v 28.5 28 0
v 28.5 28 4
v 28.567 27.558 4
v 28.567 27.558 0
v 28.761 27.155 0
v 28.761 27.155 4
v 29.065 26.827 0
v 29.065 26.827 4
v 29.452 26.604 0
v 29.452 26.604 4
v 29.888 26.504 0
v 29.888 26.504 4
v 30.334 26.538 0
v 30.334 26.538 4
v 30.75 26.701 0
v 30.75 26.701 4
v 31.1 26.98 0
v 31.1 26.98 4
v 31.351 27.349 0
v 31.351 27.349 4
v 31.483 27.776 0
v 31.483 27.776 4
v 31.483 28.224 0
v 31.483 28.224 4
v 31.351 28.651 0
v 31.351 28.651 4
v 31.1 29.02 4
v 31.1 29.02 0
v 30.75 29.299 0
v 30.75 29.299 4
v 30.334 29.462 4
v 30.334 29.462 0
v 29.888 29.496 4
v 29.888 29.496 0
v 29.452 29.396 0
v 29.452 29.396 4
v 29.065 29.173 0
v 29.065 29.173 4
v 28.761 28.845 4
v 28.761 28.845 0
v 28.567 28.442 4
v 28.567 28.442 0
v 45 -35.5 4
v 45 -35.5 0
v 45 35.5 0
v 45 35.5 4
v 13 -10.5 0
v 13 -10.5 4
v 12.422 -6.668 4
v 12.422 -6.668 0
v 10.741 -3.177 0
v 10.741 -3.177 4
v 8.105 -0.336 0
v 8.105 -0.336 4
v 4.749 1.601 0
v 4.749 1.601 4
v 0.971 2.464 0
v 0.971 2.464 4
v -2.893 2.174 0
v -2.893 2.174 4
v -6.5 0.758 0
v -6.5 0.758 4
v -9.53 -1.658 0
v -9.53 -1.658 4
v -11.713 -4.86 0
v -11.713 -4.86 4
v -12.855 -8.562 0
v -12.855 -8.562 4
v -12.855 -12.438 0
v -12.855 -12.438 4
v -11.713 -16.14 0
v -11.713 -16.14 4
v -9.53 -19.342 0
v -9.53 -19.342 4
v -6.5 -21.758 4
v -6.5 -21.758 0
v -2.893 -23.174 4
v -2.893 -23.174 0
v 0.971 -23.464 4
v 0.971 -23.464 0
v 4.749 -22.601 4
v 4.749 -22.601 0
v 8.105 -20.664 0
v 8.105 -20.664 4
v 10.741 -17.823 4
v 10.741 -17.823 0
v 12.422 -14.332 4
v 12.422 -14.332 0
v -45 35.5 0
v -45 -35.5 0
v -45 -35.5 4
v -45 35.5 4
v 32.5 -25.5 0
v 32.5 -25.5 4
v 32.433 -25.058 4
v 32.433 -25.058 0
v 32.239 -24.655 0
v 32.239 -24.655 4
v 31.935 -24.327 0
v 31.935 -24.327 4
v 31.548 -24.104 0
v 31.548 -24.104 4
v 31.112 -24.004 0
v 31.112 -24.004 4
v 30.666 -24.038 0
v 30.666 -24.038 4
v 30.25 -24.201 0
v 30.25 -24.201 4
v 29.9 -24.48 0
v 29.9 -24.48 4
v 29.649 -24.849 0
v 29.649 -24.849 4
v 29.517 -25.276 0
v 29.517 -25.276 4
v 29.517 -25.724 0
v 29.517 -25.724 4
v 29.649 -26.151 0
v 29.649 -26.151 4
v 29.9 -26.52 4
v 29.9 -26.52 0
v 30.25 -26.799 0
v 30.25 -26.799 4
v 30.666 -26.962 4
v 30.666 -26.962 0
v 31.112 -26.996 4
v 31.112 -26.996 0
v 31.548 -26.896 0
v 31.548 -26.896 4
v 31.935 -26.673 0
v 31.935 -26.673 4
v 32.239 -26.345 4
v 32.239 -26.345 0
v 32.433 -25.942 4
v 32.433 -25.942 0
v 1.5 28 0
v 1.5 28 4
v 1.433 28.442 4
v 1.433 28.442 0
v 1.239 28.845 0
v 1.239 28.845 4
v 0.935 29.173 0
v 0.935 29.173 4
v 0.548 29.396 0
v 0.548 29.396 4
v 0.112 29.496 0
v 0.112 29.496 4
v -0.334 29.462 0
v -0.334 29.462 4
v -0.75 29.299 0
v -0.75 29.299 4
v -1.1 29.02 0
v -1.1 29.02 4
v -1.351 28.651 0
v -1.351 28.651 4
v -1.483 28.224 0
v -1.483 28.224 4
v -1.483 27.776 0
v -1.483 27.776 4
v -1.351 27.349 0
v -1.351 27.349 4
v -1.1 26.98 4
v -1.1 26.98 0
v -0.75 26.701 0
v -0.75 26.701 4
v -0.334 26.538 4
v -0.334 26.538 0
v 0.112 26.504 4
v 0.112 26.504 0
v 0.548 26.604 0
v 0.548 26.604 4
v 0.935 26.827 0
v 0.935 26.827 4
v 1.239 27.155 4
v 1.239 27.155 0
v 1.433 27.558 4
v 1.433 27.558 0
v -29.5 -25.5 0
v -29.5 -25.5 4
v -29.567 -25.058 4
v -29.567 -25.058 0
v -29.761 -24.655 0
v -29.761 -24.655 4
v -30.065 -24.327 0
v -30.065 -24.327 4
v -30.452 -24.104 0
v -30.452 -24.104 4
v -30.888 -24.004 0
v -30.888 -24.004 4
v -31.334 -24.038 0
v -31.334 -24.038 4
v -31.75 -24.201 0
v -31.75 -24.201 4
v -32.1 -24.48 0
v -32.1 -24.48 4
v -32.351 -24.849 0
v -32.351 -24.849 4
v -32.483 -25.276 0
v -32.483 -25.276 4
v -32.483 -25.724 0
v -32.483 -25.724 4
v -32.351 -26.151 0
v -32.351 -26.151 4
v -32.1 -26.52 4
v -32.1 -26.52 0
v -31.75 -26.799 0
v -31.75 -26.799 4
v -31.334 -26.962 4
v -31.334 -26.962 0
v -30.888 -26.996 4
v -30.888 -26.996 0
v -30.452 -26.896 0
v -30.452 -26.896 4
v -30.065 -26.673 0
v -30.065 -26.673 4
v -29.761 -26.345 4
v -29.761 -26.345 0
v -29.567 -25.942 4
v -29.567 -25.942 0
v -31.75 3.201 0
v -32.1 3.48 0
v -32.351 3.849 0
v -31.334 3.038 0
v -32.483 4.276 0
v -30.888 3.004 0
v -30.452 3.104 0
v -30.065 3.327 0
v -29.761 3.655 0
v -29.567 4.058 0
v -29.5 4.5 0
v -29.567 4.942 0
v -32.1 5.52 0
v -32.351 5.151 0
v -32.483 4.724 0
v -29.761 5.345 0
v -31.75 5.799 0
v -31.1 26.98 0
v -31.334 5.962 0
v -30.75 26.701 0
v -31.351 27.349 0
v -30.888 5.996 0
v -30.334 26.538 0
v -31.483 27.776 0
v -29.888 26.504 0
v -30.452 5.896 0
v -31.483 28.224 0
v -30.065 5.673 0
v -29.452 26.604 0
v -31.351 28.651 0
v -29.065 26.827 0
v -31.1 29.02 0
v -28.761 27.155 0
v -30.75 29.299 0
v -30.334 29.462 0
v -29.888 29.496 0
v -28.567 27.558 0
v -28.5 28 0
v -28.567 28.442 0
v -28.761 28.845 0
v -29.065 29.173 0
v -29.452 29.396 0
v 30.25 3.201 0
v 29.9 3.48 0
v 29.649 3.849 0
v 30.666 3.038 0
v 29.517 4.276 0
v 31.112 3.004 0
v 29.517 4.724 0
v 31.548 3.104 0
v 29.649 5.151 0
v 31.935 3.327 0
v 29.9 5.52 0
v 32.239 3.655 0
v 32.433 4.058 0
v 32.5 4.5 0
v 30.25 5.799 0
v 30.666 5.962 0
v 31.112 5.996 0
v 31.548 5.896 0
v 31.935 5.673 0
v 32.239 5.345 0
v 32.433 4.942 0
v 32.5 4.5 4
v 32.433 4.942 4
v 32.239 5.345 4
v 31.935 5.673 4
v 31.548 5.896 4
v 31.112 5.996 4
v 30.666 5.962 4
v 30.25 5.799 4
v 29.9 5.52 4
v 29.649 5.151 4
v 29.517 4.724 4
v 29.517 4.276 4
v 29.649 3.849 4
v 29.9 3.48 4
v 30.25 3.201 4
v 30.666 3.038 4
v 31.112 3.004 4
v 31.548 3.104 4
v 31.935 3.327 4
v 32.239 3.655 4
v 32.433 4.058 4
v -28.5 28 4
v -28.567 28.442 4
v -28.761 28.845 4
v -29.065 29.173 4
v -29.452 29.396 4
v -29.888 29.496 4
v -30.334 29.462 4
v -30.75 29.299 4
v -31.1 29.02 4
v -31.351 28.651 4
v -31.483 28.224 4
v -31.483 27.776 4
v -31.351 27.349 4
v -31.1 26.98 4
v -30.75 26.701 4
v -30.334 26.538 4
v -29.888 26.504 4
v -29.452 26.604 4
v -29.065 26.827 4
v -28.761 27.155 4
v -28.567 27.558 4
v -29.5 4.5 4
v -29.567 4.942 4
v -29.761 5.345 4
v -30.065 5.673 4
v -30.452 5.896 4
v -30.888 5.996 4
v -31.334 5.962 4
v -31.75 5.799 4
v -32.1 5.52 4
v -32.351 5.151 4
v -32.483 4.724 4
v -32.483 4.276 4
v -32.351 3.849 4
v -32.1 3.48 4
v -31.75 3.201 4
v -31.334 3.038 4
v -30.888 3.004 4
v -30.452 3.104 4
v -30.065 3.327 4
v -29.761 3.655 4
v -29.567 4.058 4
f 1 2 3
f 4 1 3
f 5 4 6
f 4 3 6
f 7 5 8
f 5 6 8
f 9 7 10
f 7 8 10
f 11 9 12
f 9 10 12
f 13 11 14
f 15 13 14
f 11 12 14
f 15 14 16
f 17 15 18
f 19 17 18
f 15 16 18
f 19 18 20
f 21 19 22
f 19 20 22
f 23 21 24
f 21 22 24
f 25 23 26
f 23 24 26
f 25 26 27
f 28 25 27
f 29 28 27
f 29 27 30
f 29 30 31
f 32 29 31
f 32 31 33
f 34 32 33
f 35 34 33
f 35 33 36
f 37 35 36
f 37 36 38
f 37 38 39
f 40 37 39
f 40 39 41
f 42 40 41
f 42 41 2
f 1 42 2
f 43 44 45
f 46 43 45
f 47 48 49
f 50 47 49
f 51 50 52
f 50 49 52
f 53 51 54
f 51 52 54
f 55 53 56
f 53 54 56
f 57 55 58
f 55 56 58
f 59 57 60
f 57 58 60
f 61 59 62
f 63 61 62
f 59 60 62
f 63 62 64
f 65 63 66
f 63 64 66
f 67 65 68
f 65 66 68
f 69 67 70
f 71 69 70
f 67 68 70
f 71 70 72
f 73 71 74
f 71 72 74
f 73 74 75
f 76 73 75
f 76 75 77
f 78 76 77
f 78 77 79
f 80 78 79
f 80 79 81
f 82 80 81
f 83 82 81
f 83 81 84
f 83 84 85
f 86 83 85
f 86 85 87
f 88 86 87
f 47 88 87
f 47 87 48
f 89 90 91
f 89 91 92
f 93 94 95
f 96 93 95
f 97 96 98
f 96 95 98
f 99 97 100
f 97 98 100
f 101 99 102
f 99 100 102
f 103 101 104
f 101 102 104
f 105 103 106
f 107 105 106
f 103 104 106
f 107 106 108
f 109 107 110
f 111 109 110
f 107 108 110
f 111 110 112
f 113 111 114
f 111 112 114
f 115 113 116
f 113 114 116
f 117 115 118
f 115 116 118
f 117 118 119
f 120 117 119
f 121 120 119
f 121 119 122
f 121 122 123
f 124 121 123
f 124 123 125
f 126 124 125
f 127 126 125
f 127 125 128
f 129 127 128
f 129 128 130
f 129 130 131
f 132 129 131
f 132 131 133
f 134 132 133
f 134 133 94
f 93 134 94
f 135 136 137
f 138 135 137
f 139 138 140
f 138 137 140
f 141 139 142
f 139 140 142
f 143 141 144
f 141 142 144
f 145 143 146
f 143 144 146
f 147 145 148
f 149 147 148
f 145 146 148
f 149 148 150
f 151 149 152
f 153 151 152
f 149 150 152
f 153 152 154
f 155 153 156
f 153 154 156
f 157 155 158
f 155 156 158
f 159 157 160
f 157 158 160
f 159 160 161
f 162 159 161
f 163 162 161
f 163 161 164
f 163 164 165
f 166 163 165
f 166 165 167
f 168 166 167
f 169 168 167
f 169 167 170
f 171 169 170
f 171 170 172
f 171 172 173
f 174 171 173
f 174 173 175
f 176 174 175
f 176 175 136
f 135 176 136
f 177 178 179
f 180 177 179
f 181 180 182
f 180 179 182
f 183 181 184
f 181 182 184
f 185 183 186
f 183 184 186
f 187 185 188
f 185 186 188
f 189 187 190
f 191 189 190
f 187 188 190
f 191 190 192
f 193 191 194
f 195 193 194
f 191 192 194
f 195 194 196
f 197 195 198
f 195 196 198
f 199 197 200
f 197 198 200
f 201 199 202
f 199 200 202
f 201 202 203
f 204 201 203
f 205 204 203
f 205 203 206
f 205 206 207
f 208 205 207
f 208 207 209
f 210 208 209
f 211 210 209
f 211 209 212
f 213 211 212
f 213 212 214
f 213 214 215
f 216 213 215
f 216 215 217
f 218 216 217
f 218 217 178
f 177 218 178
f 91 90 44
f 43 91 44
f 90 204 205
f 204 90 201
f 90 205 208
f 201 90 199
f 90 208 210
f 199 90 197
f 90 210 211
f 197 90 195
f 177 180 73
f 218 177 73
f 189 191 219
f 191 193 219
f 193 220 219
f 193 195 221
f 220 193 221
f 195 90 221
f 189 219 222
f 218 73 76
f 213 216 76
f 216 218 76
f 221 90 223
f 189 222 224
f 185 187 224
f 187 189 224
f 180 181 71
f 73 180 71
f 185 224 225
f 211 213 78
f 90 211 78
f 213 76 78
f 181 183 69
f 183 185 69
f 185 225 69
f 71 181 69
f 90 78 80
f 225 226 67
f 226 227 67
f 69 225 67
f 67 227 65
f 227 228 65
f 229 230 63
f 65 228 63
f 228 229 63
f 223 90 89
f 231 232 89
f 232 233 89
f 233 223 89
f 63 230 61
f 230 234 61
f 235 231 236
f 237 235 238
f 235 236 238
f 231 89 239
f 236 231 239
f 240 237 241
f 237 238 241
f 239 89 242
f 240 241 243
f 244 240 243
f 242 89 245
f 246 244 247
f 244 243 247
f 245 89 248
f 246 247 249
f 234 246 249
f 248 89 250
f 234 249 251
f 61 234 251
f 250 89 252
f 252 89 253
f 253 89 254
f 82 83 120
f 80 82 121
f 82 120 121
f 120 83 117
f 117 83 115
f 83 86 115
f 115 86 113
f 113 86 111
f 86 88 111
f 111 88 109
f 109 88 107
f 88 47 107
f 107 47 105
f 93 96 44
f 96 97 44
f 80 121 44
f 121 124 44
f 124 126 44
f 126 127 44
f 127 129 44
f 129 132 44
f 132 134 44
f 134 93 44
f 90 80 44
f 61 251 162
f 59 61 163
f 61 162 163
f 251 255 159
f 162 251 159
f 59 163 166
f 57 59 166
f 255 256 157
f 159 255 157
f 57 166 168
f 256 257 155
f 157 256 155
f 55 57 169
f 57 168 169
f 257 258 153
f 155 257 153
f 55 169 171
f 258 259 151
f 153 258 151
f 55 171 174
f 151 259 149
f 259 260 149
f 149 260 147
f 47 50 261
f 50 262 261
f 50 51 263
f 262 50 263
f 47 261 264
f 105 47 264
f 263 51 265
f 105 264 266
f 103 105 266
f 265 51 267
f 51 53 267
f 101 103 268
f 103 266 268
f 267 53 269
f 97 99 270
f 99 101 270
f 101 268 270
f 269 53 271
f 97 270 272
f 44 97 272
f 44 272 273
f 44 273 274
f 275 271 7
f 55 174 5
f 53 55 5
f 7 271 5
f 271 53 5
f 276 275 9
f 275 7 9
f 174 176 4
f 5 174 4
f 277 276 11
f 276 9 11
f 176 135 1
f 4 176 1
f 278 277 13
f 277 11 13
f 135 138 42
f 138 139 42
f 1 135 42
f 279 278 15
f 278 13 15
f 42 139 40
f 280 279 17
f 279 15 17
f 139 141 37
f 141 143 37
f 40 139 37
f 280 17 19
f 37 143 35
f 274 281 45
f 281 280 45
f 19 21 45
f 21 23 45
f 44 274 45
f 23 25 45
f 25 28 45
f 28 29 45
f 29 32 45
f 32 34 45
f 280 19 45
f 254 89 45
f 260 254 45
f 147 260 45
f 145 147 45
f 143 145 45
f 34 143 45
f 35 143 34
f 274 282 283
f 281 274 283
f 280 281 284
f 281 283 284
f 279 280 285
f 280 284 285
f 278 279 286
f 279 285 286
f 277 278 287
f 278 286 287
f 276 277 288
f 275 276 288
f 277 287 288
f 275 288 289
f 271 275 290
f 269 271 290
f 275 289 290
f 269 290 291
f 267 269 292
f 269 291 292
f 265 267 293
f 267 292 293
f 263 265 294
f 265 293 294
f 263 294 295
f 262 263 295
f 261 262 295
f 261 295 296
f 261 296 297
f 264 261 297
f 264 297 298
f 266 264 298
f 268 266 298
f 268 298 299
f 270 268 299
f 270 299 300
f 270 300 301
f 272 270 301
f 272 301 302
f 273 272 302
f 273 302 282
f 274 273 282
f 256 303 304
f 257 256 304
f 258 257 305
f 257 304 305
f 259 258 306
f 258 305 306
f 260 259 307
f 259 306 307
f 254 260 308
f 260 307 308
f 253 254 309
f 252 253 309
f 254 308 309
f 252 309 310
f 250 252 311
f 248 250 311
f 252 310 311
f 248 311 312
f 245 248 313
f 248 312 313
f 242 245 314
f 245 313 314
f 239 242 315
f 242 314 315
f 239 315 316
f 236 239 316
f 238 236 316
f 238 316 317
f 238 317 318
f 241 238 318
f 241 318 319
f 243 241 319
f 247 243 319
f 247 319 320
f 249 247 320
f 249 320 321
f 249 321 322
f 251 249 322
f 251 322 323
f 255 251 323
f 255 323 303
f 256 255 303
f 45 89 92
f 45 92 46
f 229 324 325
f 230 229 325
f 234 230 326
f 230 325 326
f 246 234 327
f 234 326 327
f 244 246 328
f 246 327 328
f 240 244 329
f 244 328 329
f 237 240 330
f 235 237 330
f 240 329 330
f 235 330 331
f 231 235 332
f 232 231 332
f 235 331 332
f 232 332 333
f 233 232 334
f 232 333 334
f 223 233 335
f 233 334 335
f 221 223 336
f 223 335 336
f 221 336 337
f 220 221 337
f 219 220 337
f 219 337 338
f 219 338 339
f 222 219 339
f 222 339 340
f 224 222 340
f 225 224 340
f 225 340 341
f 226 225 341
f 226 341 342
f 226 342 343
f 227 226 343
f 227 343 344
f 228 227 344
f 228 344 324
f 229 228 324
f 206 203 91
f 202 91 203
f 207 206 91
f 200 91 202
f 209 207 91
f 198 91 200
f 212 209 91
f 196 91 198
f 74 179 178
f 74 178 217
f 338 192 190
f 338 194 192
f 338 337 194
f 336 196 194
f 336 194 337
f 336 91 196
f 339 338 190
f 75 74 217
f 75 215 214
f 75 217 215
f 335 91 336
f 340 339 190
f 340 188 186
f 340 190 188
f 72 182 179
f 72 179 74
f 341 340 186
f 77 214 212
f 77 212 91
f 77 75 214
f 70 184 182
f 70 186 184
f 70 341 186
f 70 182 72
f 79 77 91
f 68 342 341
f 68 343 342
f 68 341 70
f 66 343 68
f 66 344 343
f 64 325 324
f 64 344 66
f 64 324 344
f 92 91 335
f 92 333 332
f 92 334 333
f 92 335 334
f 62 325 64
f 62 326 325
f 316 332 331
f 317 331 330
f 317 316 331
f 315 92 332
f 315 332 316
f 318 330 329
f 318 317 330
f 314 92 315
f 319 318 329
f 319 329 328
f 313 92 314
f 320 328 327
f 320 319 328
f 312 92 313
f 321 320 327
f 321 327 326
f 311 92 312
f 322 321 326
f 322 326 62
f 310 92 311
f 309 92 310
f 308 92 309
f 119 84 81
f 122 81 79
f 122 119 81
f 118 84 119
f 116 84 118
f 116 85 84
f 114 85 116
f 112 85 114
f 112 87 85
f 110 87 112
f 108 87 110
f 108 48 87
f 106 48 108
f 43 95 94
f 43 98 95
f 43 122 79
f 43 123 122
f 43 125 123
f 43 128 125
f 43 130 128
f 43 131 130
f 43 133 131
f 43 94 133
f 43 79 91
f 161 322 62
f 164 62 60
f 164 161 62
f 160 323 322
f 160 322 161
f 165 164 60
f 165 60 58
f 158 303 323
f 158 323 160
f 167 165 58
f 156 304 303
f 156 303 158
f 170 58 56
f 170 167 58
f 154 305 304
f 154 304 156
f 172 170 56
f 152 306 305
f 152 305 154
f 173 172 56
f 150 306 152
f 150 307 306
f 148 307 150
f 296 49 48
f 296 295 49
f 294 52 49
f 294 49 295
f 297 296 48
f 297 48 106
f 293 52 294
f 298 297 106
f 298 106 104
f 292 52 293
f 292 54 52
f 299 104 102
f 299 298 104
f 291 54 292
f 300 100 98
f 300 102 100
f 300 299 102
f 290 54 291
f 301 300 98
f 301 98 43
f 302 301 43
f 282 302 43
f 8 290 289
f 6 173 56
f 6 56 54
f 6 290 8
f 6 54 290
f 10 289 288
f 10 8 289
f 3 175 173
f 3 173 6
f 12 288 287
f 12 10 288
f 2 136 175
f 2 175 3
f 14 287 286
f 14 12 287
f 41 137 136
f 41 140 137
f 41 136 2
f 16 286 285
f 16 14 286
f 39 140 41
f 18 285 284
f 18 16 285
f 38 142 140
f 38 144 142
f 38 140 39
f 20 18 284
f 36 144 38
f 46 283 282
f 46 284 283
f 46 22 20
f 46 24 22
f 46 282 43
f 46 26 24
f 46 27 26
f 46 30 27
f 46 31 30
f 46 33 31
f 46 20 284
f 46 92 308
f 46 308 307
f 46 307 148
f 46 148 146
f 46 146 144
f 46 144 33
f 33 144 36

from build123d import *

# Parameters (mm, degrees)
SKETCH_1_W          = 90
SKETCH_1_H          = 71
EXTRUDE_1_DEPTH     = 4
SKETCH_2_R          = 1.5
CUT_EXTRUDE_1_DEPTH = 58.456505289
SKETCH_3_R          = 13
SKETCH_3_R_2        = 1.5
CUT_EXTRUDE_2_DEPTH = 58.456505289


with BuildPart() as part:
    # 草图1 → 凸台-拉伸1 (new body)
    with BuildSketch(Plane.XY):
        Rectangle(SKETCH_1_W, SKETCH_1_H)
    extrude(amount=EXTRUDE_1_DEPTH)

    # 草图2 → 切除-拉伸1 (cut, through all)
    with BuildSketch(Plane.XY.offset(4)):
        with Locations((0, 28)):
            Circle(SKETCH_2_R)
        with Locations((-30, 28)):
            Circle(SKETCH_2_R)
        with Locations(Location((30, 28, 0), (0, 0, 180))):
            Circle(SKETCH_2_R)
    extrude(amount=-CUT_EXTRUDE_1_DEPTH, mode=Mode.SUBTRACT)

    # 草图3 → 切除-拉伸2 (cut, through all)
    with BuildSketch(Plane.XY.offset(4)):
        with Locations((0, -10.5)):
            Circle(SKETCH_3_R)
        with Locations((-31, 4.5)):
            Circle(SKETCH_3_R_2)
        with Locations((-31, -25.5)):
            Circle(SKETCH_3_R_2)
        with Locations((31, -25.5)):
            Circle(SKETCH_3_R_2)
        with Locations((31, 4.5)):
            Circle(SKETCH_3_R_2)
    extrude(amount=-CUT_EXTRUDE_2_DEPTH, mode=Mode.SUBTRACT)


solid = part.part
